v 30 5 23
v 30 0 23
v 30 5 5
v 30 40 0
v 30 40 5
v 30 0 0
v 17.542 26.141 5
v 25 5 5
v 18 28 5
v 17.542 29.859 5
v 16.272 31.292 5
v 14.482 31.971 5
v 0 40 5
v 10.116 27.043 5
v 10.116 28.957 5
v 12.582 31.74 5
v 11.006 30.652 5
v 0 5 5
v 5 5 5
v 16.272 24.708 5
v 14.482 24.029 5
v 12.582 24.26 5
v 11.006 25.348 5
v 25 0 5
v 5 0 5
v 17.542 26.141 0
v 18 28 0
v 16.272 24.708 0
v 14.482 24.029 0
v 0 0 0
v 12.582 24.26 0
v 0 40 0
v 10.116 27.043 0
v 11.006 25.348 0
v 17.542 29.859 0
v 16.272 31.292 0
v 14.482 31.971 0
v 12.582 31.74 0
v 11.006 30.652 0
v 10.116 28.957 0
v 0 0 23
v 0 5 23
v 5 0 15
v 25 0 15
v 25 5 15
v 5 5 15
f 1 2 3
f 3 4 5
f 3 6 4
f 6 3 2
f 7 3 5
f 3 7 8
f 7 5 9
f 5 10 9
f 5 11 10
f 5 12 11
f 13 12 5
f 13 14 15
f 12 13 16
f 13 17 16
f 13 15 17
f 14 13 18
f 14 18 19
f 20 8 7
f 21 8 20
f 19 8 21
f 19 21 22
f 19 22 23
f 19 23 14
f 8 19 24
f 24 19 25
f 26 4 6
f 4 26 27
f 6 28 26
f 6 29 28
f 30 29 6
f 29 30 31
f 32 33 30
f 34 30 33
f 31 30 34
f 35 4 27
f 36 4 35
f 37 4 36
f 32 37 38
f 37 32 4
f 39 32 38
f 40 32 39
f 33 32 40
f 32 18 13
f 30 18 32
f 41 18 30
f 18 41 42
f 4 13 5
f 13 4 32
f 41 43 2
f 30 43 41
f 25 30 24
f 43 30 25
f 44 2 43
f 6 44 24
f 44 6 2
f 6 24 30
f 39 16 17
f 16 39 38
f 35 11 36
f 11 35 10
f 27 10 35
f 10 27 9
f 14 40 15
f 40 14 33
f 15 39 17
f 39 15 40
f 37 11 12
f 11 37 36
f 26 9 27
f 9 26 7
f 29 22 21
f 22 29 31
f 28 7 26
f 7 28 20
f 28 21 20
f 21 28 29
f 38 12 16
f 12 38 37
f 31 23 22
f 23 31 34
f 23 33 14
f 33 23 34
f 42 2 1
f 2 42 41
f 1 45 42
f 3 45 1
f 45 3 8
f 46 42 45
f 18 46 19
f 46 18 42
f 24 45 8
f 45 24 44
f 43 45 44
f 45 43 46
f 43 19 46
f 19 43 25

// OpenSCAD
//calipers holders

difference(){
	cube([30, 40, 5]);
	
	translate([14, 28,-2])
		cylinder(10, 4 , 4);
	}

difference(){
	cube([30, 5, 23]);
	
	translate([5, -1, 5])
	cube([20, 7, 10]);
	}	
